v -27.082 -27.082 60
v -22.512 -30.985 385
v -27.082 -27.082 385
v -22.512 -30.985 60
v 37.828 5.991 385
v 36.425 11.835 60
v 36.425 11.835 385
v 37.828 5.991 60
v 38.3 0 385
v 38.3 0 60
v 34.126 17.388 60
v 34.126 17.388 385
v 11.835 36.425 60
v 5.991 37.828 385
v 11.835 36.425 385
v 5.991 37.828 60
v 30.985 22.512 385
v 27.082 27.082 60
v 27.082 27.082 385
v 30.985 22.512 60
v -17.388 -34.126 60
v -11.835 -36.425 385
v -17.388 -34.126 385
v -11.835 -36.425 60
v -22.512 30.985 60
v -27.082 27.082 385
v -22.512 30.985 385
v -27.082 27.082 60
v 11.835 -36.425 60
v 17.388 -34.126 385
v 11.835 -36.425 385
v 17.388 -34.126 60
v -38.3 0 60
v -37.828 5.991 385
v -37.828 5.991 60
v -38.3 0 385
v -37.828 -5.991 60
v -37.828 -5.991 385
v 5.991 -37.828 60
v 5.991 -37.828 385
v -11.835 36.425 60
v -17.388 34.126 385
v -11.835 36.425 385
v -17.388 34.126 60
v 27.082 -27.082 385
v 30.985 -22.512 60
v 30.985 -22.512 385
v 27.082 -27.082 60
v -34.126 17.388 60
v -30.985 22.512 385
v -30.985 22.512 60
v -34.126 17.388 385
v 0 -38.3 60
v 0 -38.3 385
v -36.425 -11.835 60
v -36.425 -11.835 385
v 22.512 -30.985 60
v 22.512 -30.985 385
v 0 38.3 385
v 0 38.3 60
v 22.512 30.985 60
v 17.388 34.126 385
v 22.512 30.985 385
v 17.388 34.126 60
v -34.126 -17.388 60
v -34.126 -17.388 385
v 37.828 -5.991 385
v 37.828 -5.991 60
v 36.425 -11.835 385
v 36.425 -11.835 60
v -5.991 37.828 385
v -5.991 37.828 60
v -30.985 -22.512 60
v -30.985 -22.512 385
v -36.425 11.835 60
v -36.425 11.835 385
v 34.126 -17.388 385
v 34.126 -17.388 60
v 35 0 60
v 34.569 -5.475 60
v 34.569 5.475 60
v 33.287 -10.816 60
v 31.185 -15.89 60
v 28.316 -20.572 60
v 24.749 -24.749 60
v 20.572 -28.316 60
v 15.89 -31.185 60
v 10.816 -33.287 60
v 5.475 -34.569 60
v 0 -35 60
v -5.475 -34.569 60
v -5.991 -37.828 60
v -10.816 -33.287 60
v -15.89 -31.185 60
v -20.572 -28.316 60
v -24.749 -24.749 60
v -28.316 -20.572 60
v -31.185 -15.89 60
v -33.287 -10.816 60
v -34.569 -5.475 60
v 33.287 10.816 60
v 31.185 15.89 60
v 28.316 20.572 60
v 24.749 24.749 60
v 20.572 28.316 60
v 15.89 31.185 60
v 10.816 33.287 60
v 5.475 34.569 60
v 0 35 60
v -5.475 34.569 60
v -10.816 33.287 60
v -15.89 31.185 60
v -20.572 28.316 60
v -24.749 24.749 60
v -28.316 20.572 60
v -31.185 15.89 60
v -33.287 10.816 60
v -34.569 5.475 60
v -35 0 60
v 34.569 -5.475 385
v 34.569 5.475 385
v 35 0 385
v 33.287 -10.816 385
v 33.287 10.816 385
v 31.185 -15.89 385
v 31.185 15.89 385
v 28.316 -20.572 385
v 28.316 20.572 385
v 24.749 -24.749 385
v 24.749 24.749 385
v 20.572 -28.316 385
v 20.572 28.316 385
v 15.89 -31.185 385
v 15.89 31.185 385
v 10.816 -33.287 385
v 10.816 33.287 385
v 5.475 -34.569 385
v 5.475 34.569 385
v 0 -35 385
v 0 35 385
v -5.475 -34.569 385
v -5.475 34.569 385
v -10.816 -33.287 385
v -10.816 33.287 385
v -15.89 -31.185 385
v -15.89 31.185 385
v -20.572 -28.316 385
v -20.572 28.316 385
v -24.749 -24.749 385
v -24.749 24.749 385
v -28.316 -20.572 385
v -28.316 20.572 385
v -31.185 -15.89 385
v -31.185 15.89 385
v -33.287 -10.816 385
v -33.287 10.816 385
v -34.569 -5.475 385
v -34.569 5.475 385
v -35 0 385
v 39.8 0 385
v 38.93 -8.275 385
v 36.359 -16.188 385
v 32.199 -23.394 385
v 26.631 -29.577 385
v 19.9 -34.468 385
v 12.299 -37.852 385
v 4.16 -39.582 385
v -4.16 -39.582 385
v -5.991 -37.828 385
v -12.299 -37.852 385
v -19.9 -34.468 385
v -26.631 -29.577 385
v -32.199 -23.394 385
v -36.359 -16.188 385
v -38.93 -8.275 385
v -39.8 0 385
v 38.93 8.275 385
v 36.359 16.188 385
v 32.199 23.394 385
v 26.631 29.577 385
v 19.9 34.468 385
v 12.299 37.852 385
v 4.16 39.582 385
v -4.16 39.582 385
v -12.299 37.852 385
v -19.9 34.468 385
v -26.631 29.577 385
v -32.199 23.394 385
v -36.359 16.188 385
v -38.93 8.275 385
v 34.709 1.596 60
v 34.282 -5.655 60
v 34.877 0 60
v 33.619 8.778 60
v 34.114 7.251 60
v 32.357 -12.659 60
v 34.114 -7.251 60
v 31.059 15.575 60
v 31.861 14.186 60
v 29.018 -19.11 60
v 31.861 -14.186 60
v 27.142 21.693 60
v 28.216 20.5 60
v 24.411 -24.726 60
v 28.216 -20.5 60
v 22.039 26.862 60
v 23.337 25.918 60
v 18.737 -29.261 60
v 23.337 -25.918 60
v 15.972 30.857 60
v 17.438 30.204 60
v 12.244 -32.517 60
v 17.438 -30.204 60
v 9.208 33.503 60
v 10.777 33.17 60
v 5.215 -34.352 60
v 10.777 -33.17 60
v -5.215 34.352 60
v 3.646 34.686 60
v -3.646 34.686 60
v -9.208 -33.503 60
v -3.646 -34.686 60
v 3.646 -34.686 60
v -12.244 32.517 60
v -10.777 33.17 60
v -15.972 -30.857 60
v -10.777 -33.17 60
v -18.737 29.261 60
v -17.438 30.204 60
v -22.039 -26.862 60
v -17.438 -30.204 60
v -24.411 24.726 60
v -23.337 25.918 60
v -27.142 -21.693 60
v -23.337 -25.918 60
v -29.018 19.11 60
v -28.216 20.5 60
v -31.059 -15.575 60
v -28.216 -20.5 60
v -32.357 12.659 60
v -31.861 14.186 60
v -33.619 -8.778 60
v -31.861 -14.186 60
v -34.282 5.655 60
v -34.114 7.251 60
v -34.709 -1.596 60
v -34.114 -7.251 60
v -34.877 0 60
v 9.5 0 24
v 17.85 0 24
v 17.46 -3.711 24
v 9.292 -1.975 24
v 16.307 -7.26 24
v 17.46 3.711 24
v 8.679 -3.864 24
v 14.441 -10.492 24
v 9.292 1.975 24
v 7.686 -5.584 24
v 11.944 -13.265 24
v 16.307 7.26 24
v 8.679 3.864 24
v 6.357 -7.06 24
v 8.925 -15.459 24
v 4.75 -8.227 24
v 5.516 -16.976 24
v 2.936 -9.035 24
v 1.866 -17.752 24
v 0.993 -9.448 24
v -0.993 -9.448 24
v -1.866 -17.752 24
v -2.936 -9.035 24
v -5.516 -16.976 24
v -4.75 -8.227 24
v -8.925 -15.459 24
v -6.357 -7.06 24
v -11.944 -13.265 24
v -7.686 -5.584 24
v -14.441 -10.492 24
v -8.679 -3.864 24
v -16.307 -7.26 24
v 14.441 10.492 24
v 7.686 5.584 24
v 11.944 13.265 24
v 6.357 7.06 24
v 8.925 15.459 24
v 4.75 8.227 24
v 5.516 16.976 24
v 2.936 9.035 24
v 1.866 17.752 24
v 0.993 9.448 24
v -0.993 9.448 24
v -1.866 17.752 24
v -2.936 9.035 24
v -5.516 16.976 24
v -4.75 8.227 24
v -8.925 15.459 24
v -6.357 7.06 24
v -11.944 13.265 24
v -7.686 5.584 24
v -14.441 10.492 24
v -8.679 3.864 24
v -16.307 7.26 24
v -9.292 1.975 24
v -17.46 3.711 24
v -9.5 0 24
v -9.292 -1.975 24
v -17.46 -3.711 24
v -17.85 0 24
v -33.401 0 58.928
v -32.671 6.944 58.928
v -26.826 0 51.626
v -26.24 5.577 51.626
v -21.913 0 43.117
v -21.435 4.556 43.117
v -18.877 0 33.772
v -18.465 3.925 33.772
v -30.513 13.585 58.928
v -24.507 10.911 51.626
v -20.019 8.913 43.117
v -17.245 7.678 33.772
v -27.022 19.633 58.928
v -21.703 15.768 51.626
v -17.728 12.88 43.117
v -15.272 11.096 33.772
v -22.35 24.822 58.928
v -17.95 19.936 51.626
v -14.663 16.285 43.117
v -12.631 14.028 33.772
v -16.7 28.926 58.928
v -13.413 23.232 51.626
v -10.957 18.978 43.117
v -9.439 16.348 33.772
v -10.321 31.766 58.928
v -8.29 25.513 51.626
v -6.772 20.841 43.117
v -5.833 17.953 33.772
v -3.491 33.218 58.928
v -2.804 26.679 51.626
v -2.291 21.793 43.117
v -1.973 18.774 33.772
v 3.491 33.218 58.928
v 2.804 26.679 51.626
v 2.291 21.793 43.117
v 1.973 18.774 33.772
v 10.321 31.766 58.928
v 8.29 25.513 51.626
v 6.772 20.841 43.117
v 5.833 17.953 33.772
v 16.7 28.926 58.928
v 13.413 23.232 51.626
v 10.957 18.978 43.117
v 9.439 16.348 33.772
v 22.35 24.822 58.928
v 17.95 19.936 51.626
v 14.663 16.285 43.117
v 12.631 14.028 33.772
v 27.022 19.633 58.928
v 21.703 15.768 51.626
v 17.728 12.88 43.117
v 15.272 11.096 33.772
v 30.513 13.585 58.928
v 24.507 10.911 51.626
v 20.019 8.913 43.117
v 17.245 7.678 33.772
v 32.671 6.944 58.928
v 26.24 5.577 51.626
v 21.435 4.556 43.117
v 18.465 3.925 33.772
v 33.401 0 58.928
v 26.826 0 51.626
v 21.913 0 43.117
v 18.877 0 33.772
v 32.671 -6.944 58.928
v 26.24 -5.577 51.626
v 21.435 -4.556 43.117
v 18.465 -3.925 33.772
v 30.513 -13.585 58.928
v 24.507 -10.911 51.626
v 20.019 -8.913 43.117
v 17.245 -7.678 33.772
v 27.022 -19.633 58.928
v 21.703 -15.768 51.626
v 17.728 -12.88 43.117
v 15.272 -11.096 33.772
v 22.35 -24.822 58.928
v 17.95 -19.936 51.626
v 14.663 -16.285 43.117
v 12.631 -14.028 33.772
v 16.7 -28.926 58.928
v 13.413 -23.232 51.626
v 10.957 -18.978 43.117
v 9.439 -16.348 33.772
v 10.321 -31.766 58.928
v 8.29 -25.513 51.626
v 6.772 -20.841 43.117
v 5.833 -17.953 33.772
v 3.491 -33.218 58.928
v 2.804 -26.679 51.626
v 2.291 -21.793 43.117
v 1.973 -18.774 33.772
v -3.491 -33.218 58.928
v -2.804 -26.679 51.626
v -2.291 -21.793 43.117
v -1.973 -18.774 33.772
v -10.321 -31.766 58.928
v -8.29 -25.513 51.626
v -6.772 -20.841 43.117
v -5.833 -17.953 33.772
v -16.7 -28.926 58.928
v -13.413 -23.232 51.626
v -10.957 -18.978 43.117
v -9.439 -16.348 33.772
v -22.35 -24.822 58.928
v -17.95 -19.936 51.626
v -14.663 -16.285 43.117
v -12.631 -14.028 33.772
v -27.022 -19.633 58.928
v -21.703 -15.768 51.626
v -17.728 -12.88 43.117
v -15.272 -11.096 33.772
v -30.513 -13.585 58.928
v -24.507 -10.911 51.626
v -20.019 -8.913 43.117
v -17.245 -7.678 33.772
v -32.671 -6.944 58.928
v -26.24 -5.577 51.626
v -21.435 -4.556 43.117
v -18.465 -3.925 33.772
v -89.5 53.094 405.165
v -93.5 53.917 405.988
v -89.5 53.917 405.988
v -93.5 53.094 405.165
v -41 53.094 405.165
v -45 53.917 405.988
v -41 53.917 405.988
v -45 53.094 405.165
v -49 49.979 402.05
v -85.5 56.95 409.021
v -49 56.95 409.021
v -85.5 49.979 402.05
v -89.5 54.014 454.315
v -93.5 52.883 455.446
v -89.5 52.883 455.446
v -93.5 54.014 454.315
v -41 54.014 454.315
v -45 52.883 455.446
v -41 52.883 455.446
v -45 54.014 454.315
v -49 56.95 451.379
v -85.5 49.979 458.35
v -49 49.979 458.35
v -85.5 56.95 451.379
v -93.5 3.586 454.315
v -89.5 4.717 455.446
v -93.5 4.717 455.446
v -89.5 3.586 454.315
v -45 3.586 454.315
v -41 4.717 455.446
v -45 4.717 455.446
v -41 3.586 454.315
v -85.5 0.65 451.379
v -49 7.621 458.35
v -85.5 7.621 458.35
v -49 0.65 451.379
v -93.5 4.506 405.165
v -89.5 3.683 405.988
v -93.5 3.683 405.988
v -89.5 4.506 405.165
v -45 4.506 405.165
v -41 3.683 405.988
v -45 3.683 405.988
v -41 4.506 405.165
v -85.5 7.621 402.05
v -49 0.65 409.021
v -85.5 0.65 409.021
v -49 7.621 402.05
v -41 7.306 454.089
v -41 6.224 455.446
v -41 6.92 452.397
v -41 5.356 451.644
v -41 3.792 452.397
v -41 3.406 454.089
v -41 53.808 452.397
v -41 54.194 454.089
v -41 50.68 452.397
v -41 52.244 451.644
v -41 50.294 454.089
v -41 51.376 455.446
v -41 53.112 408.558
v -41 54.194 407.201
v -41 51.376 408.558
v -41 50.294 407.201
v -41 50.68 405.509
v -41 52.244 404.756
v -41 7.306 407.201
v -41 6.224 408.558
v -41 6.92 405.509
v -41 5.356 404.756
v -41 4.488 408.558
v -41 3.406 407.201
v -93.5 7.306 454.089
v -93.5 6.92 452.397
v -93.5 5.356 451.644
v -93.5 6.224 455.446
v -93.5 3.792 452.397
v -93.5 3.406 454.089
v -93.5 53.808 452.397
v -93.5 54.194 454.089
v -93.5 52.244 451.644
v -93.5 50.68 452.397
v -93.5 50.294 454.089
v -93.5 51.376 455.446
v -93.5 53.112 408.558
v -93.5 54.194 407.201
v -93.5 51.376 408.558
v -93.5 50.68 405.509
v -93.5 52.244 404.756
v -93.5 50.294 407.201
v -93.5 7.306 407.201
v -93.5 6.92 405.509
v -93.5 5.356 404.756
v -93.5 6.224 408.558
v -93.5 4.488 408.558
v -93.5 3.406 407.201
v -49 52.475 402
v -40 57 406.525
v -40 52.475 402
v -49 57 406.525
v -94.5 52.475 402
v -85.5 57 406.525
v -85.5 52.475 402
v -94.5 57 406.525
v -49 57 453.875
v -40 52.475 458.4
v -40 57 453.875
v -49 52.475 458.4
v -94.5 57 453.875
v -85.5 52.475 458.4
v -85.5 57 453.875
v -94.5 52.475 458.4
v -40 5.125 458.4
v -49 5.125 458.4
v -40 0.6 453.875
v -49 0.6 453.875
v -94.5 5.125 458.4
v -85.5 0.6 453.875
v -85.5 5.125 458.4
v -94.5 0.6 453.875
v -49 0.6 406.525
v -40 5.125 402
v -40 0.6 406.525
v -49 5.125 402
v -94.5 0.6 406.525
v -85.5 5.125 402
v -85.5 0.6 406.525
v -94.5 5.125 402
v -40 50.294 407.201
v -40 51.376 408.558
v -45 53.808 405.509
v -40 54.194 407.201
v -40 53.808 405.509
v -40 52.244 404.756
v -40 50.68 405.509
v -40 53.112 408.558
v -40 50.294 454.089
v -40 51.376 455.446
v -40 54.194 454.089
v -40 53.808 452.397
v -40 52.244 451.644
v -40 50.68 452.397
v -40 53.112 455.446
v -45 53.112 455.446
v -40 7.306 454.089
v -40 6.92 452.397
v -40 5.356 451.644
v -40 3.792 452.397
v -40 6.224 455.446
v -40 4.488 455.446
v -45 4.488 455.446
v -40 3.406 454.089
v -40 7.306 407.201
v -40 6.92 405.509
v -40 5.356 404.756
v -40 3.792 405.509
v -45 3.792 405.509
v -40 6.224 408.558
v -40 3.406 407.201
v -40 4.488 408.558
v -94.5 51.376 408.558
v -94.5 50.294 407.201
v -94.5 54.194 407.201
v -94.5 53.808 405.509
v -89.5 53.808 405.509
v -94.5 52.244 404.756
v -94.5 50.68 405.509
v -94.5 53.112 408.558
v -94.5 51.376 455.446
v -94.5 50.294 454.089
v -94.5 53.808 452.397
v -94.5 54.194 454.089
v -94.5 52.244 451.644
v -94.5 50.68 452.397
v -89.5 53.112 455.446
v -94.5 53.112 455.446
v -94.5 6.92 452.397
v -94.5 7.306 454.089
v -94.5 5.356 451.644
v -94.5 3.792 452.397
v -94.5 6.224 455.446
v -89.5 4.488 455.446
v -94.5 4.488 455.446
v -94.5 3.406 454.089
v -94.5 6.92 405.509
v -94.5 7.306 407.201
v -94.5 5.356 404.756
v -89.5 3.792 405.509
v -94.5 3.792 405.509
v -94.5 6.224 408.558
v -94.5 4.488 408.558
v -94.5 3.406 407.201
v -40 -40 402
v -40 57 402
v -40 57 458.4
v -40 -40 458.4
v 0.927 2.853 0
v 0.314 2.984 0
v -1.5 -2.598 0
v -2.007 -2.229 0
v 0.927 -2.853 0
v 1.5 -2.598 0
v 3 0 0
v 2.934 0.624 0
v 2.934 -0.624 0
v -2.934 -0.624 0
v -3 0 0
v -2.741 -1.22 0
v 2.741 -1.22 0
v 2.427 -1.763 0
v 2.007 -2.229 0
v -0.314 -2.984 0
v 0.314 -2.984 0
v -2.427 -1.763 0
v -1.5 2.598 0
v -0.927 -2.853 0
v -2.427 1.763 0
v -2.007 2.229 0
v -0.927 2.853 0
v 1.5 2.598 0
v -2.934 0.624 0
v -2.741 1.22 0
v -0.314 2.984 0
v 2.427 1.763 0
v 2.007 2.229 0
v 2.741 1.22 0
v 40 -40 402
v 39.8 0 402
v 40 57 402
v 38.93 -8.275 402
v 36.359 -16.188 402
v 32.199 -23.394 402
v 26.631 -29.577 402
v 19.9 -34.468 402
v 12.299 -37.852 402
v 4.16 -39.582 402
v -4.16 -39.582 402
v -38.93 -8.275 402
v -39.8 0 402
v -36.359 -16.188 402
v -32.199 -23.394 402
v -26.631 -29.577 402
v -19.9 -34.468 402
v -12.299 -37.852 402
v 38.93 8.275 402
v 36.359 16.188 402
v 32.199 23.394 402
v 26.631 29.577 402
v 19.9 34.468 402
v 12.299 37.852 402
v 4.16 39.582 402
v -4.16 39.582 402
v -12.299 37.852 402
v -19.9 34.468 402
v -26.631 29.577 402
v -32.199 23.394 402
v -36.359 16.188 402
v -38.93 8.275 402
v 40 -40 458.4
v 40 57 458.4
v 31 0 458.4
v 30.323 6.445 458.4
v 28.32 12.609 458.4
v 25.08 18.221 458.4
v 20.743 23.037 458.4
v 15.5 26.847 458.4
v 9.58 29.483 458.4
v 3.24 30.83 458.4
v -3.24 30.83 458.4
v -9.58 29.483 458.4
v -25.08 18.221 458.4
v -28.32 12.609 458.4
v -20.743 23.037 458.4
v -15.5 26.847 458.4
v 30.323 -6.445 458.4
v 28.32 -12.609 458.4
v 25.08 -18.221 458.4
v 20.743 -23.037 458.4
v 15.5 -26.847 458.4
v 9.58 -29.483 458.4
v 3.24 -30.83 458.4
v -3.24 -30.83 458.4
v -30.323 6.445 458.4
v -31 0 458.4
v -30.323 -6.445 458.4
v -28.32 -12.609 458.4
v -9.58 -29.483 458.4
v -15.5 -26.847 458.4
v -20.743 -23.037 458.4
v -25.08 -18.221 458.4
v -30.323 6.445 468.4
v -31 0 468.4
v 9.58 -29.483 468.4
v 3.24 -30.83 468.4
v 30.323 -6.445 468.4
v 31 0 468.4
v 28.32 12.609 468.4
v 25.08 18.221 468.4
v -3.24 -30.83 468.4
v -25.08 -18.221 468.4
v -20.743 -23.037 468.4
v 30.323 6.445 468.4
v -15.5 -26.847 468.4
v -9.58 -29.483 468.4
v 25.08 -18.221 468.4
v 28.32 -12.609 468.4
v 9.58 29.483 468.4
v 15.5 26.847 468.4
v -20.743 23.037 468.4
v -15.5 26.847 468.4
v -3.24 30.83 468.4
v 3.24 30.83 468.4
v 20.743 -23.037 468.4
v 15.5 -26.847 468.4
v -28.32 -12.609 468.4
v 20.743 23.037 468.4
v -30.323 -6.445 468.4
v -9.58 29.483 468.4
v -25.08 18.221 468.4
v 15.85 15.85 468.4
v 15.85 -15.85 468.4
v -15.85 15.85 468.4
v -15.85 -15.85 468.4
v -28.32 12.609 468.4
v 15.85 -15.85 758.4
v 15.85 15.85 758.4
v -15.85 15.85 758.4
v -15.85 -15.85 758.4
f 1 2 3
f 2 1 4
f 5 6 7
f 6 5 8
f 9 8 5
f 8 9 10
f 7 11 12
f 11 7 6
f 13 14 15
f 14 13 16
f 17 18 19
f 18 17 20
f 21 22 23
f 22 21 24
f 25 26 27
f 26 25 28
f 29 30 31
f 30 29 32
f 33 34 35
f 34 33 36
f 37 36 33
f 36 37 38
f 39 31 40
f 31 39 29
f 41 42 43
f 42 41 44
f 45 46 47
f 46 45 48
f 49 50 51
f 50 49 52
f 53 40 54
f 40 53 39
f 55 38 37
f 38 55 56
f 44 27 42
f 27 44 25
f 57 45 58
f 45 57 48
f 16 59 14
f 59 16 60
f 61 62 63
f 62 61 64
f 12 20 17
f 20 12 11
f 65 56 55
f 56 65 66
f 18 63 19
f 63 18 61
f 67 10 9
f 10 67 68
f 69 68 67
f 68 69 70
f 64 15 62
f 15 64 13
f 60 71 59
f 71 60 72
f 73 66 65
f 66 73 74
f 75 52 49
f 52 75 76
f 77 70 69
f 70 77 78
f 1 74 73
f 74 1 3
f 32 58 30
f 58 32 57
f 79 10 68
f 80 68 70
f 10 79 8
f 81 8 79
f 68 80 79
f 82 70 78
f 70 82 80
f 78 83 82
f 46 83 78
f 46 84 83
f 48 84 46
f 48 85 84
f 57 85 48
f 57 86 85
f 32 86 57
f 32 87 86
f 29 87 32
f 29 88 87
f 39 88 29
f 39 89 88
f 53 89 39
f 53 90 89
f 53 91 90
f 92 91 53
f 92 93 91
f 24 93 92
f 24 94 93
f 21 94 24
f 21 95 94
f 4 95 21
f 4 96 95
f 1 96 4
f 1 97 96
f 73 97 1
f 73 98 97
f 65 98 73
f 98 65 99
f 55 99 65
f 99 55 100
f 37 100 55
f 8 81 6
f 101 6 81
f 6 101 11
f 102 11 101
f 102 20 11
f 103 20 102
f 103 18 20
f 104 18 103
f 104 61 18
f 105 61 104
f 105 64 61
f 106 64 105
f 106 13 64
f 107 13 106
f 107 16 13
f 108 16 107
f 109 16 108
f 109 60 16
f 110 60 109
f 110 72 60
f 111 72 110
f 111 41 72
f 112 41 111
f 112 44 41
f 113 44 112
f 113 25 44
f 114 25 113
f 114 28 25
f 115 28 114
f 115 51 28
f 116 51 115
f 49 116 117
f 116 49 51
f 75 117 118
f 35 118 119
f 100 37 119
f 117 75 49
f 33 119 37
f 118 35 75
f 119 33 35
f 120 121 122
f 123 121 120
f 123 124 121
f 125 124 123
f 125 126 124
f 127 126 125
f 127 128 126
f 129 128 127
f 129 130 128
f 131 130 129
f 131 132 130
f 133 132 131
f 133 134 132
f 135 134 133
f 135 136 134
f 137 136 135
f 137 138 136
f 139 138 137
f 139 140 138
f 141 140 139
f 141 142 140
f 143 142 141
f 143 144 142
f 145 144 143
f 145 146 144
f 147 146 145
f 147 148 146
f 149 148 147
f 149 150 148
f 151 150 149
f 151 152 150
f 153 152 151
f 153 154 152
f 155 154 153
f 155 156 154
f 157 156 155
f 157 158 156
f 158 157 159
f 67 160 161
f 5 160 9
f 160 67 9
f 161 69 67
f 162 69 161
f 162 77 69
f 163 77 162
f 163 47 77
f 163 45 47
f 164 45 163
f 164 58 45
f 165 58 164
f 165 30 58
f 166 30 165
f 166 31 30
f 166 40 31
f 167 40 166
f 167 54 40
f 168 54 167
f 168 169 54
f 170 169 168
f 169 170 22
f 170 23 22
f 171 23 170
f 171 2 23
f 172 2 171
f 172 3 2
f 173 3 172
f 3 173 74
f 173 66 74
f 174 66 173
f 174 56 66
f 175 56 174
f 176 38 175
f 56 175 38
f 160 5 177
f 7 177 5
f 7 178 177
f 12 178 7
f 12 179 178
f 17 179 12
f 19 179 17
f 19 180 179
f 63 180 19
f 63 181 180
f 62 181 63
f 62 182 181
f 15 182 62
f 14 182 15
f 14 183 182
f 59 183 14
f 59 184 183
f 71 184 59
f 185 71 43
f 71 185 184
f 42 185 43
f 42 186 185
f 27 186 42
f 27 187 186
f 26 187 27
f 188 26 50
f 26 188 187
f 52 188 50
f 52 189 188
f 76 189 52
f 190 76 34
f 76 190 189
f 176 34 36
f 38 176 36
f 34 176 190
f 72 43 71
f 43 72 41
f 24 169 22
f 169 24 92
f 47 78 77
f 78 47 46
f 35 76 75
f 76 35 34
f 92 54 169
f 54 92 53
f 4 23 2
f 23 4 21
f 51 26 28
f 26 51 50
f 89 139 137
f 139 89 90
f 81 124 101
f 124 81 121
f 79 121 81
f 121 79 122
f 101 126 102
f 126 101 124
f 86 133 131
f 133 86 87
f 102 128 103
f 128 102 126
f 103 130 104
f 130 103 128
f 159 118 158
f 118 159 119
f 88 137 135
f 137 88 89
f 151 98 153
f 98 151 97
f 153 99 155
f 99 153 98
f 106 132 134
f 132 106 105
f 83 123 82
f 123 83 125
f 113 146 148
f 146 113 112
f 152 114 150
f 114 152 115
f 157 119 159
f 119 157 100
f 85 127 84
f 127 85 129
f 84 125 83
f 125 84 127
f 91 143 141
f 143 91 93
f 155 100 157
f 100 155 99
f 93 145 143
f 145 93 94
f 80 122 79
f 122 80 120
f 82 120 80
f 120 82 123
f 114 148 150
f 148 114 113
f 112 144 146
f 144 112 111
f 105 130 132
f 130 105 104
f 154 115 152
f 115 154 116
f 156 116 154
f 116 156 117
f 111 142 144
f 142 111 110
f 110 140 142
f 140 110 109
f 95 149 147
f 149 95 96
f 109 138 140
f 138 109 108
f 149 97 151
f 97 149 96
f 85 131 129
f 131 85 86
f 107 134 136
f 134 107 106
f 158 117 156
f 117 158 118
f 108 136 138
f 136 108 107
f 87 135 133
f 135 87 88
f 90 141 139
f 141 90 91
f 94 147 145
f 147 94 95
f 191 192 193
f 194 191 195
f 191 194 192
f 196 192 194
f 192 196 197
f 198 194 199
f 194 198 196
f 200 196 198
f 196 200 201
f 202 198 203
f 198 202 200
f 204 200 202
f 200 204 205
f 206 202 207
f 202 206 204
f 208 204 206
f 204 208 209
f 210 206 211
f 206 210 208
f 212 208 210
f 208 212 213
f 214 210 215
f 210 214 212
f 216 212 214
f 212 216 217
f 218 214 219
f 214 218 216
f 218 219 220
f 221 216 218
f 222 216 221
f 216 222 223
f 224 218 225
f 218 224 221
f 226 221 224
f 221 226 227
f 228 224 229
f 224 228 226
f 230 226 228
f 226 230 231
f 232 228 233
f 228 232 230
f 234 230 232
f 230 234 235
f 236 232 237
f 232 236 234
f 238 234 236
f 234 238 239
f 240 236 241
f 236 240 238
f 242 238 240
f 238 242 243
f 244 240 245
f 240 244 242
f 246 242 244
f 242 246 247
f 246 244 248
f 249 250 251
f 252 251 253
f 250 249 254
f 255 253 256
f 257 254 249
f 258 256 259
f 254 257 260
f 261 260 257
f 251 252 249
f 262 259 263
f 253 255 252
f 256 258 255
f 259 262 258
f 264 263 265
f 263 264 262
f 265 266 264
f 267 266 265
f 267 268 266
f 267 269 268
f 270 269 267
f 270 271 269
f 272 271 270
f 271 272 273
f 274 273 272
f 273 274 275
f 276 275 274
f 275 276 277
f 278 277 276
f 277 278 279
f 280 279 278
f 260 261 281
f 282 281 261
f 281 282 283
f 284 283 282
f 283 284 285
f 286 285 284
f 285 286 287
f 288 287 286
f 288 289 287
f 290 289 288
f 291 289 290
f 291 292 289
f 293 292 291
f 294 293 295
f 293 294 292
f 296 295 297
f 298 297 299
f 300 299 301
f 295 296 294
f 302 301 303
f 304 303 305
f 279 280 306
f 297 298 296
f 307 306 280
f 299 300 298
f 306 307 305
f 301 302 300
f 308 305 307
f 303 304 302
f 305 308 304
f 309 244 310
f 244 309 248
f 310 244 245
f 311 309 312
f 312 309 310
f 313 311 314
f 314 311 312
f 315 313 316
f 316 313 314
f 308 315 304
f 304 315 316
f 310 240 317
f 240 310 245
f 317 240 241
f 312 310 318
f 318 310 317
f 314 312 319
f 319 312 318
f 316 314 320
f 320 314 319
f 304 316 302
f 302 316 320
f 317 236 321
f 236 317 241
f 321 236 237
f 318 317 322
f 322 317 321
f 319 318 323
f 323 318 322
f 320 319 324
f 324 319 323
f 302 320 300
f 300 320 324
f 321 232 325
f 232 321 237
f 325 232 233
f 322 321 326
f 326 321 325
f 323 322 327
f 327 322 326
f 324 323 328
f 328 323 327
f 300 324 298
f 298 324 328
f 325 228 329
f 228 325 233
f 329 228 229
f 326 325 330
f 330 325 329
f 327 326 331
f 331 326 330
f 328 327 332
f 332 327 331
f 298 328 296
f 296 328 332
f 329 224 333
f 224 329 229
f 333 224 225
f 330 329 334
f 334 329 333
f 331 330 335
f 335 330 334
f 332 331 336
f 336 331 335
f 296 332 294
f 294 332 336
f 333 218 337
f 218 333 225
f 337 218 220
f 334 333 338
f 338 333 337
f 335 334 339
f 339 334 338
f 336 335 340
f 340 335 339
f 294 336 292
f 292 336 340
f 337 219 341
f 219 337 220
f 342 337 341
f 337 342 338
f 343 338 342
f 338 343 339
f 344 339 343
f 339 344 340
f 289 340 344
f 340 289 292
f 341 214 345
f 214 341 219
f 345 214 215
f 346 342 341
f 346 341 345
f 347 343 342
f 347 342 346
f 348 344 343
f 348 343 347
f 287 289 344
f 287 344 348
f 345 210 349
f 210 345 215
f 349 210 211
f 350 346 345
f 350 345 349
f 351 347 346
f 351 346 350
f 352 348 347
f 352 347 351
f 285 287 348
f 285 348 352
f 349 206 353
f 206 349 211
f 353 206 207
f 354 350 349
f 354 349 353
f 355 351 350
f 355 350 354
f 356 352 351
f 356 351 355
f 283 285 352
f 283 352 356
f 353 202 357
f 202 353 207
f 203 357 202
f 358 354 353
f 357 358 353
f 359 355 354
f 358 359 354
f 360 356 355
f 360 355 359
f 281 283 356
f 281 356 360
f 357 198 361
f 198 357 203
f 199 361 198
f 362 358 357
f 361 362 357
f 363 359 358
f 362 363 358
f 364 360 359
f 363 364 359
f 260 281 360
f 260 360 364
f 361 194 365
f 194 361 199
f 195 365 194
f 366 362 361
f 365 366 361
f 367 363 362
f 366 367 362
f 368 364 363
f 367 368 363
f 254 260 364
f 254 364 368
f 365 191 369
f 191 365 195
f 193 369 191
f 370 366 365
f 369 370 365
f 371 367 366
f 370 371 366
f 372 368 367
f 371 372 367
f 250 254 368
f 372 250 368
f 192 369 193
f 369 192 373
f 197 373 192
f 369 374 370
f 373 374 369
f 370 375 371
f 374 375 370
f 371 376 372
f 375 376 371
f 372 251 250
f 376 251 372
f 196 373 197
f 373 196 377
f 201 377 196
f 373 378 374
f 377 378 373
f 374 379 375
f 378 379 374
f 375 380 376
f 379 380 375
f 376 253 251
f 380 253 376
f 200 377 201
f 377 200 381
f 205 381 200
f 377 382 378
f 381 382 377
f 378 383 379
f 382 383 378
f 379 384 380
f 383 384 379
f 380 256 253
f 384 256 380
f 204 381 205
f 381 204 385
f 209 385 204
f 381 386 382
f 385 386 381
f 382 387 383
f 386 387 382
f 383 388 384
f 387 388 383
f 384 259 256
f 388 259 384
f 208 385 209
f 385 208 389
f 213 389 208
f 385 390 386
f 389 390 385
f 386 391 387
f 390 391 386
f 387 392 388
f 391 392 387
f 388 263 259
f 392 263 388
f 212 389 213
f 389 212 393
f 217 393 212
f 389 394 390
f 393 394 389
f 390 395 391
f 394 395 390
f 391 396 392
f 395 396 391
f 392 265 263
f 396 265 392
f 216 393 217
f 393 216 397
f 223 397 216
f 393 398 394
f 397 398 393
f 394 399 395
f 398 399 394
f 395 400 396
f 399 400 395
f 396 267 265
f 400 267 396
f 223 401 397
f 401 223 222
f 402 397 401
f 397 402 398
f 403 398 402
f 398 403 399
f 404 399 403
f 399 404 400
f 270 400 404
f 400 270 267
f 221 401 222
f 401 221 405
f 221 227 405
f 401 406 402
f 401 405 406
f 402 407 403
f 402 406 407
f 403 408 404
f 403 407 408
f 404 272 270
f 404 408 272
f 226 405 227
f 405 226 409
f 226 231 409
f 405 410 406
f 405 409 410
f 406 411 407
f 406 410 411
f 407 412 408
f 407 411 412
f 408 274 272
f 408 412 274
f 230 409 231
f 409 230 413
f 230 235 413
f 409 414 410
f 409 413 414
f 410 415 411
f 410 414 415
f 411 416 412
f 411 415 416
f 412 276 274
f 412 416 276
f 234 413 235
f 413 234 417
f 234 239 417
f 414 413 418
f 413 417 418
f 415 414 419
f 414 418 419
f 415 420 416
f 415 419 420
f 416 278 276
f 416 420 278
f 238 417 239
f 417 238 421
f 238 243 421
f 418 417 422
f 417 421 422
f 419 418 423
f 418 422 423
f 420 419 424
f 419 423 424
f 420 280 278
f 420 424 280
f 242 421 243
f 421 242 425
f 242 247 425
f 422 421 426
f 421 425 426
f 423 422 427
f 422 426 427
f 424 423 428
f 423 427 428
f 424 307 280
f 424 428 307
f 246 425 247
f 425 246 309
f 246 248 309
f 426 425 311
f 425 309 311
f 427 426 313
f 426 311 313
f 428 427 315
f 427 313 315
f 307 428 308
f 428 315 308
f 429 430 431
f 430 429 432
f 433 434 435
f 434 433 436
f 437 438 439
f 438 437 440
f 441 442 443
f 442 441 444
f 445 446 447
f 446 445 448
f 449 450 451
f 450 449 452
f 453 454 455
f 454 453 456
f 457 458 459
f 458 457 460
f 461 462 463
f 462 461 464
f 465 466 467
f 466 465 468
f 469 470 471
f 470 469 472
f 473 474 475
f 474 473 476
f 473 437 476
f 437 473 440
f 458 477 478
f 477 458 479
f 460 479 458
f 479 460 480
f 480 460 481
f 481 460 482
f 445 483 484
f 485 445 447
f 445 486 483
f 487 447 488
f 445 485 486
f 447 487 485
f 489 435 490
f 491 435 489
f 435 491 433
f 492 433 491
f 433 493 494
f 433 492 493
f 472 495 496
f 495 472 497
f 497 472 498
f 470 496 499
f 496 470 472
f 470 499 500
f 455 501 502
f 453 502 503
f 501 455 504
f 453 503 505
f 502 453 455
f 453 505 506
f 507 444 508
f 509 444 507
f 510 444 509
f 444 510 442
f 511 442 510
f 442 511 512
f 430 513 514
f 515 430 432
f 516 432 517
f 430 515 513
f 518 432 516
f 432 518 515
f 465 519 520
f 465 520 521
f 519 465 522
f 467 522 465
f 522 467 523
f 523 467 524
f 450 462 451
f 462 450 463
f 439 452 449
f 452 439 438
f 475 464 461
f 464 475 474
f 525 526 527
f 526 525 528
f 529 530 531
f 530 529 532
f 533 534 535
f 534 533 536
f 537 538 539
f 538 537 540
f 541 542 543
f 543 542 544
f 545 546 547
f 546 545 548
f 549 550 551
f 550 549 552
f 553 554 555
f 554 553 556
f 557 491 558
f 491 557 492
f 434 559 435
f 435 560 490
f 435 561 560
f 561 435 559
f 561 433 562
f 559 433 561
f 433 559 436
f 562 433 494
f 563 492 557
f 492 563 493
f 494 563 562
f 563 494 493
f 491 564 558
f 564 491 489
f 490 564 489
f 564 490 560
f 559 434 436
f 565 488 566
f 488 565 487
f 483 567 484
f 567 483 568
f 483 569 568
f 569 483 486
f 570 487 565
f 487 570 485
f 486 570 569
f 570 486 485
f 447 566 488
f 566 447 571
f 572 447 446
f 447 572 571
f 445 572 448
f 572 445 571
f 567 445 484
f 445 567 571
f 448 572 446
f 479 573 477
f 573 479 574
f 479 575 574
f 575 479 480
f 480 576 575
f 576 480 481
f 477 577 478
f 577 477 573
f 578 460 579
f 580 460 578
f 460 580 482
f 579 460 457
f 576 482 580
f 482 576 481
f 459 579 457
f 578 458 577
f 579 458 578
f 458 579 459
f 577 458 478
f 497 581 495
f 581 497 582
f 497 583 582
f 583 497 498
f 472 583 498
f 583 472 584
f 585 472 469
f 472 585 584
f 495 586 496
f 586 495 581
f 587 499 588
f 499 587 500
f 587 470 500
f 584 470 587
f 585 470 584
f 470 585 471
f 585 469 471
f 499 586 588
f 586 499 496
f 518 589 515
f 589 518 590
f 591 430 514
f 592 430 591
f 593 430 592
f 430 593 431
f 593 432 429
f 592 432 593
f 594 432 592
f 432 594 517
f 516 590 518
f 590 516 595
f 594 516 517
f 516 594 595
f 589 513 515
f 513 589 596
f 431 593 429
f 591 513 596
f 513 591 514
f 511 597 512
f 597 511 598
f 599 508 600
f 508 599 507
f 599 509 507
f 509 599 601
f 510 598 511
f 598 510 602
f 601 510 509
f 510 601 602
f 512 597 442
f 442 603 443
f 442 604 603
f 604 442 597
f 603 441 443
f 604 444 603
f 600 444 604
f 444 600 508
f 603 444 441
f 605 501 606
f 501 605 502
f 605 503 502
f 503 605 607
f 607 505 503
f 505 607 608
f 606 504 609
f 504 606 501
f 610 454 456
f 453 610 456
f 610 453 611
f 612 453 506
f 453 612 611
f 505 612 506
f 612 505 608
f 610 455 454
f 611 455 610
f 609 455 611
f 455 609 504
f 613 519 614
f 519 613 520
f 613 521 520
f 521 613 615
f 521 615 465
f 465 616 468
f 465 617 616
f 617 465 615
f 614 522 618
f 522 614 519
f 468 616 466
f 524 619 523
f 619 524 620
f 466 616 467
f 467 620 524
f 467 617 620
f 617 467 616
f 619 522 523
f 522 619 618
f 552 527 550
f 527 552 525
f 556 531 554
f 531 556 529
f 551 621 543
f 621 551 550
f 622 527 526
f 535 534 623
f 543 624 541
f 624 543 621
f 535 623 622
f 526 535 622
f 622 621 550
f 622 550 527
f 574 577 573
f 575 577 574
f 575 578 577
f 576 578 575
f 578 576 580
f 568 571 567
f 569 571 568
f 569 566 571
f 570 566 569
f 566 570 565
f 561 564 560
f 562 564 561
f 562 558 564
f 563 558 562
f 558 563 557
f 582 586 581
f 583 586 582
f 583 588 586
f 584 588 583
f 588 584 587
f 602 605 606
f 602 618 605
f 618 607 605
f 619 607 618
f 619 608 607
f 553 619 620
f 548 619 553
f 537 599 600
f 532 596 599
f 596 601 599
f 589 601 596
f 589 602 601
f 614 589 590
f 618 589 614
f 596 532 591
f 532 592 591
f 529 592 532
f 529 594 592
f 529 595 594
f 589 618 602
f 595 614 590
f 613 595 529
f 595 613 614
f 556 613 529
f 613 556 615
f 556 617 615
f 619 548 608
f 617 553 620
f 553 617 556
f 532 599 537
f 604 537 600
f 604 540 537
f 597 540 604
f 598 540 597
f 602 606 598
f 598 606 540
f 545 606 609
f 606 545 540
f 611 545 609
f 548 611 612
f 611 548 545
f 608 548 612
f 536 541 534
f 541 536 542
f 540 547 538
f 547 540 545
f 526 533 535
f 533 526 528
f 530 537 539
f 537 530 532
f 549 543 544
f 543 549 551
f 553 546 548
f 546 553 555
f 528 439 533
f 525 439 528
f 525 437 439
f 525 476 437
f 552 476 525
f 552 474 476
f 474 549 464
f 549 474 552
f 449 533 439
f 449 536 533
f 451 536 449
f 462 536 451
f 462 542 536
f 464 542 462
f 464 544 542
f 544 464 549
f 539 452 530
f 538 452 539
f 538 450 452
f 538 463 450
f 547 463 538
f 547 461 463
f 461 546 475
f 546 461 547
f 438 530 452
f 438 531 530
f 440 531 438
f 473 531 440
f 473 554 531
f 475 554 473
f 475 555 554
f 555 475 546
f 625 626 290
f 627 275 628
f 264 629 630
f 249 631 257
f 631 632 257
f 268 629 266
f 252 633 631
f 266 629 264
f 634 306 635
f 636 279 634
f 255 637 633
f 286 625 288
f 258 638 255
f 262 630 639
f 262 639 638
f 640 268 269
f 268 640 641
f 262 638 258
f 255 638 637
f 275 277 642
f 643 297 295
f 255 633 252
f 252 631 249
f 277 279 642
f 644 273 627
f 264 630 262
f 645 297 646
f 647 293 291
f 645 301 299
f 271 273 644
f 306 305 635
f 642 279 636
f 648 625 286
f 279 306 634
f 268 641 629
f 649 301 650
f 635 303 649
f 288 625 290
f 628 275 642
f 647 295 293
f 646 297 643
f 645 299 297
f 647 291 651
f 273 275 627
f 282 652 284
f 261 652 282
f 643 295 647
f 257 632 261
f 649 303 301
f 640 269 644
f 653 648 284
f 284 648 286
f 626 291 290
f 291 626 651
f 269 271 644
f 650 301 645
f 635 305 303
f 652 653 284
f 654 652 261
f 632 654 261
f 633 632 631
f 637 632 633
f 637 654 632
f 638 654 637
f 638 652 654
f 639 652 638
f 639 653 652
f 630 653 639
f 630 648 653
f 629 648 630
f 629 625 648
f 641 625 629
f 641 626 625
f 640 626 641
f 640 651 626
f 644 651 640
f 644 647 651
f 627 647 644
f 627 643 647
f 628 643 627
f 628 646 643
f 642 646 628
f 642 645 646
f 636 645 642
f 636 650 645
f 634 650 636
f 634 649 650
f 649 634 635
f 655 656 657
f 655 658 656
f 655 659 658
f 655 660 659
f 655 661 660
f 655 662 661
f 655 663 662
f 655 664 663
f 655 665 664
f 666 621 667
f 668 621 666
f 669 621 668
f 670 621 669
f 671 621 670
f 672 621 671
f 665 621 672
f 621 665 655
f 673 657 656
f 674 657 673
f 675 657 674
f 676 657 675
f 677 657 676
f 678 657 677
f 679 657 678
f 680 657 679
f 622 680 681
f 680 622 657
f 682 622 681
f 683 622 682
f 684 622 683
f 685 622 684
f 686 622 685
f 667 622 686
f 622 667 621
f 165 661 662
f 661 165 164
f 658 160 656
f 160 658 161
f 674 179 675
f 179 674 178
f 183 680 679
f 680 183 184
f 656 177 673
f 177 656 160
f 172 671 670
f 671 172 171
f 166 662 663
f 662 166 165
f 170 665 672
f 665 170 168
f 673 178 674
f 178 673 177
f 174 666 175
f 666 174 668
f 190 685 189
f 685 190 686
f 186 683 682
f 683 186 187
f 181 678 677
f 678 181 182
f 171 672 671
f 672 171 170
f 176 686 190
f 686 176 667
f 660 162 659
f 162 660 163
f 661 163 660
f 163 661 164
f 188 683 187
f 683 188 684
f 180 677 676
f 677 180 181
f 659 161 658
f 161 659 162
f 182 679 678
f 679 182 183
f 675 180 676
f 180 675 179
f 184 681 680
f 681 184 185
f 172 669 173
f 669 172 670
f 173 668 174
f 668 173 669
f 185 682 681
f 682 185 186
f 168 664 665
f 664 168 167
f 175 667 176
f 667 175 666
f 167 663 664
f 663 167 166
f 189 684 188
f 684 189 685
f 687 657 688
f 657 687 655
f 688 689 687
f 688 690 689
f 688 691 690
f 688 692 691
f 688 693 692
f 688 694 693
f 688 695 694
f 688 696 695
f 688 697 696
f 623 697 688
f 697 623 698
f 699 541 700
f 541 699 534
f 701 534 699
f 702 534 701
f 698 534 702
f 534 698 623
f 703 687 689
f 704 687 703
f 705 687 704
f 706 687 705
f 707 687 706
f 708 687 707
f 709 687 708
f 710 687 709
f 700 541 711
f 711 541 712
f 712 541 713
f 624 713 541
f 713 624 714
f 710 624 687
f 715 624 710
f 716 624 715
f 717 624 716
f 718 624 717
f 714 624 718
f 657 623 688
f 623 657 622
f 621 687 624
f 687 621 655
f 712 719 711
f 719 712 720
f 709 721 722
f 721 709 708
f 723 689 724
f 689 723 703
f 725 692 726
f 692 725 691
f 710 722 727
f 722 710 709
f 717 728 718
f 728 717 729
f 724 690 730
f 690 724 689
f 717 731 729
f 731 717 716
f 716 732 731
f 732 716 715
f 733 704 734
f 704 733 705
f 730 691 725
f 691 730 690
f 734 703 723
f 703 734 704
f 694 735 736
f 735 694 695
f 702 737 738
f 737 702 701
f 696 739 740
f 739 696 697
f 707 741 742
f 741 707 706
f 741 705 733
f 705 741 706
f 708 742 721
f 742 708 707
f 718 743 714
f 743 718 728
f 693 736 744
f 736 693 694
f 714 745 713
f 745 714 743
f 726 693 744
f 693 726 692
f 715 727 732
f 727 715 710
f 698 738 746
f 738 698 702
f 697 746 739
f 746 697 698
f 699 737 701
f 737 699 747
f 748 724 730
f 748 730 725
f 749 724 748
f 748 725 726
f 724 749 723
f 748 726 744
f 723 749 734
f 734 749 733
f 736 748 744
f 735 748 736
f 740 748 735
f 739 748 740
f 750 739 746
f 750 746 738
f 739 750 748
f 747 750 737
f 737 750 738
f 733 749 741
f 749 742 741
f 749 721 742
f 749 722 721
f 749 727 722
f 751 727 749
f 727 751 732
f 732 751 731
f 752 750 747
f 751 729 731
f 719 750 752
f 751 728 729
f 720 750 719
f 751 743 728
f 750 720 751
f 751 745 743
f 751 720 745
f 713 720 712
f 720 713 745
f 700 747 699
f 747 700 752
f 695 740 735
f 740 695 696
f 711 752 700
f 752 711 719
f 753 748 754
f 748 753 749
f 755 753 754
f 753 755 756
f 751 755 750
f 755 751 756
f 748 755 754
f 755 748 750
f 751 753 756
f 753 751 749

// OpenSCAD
// file: lib/parameters.scad
// Parameters shared between modules
Base_th = 2;
Beam_width = 15;
Wiggle = 0.25;
Fat_beam_width = Beam_width + Wiggle;
Beam_length = 400;
Wall_th = 2.5;
Min_beam_width = 12.5;
Max_beam_width = 17.5;
Zip_th = 2;
Zip_h = Zip_th + Max_beam_width - Min_beam_width;
Zip_w = 5.0;
Nema17_cube_width          = 42.43;
Nema17_screw_hole_width    = 43.74; // Opposite corner screws
Nema17_ring_diameter       = 22;
Nema17_cube_height         = 39.36;
Nema17_shaft_height        = 63.65;
Nema17_ring_height         = 2;
Nema17_shaft_radius        = 5/2;

Nema23_cube_width          = 56.4;
Nema23_cube_height         = 54.5;
Nema23_shaft_height        = 100;
Nema23_screw_hole_width    = 66.31; // Opposite corner screws
b608_outer_dia = 22.2;
b608_width = 7.05;
b608_bore_r = 4;
b608_vgroove_big_r = b608_outer_dia/2 + 2.5;
b608_vgroove_small_r = b608_outer_dia/2 + 0.5;
b608_ugroove_big_r = b608_vgroove_big_r;
b608_ugroove_small_r = b608_vgroove_small_r;
Gap_between_sandwich_and_plate = 1.5 + Base_th; // 1.5 mm for wiggle
Motor_bracket_flerp_r = 6;
Motor_bracket_flerp = 14;
Motor_bracket_cw = Nema17_cube_width + 6;
Motor_bracket_att_ang = 50;
Mounting_screw_d = 3.5;
Mounting_screw_head_d = 14;
Spool_outer_wall_th = 4;

// Corner clamp parameters
Cc_l1 = (Fat_beam_width+2*Wall_th)*2*sqrt(3);
Cc_rad_b = 4;
Cc_action_point_from_mid = Cc_l1/sqrt(3)-2*Cc_rad_b-7;
Cc_plastic_length = sqrt(Cc_action_point_from_mid*Cc_action_point_from_mid
                       - (Cc_action_point_from_mid/2)*(Cc_action_point_from_mid/2));
Eyelet_extra_dist = 0.75;
Eyelet_diameter = 4.30;
Move_d_bearings_inwards = -2;

// The distance between the two action points on the mover
Sidelength = Beam_length + 2*Cc_plastic_length;

/////// Gear parameters ////////////
Circular_pitch = 262;
Motor_teeth = 10;
Gear_height = 21.4-3;
Motor_pitch                      = (Motor_teeth*Circular_pitch/360);
Motor_pitch_diametrial           = Motor_teeth/(2*Motor_pitch);
Motor_outer_radius               = Motor_pitch + 1/Motor_pitch_diametrial;
Spool_teeth = 100;
Spool_r = 75;
Spool_height = 8;
Spool_pitch                      = (Spool_teeth*Circular_pitch/360);
Spool_pitch_diametrial           = Spool_teeth/(2*Spool_pitch);
Spool_outer_radius               = Spool_pitch + 1/Spool_pitch_diametrial;
Sep_disc_radius = (161.83+1)/2; // Made to match 255 teeth gt2 pulley + 1
Motor_bracket_depth = Gear_height+1+7+Nema17_ring_height+1+Gap_between_sandwich_and_plate;
Spool_core_flerp0 = 16+3;

/////// Lineroller parameters ////////////
b623_width  = 4;
b623_bore_r = 3/2;
b623_big_ugroove_big_r = (12+3)/2;
b623_big_ugroove_small_r = (10+3)/2;
b623_outer_dia = 10;
b623_ugroove_room_to_grow_r = 1.1;
b608_ugroove_room_to_grow_r = 1.1;
b623_flange_dia = 11.5;
b623_flange_room_to_grow_r = 0.5;

Depth_of_roller_base = 18;
Roller_flerp = 6;
Roller_l = 42;
Roller_fl = (Roller_l - Depth_of_roller_base)/2;

Line_roller_wall_th = 5;

Line_roller_ABC_winch_h =  Gap_between_sandwich_and_plate
                           + Sep_disc_radius
                           - Spool_r
                           + Depth_of_roller_base/2
                           + b608_vgroove_small_r;

Ptfe_r = 2.1;
Roller_base_r = 8;
Screw_h = 2;
Screw_head_h = 2;
M3_screw_head_d = 5.8;
Spool_center_bearing_wall_th = 5;
Corner_clamp_bearings_center_to_center = max(15, (b623_big_ugroove_big_r + b623_ugroove_room_to_grow_r)*2 + 5);
Anchor_bearings_center_to_center = Corner_clamp_bearings_center_to_center + b623_outer_dia;

//// Lineroller anchor parameters /////

Back_bearing_x = 6 + 1.5;
Front_bearing_x = -6 - 5;
Move_tower = -12.2;
Lower_bearing_z = 13;
Higher_bearing_z = Lower_bearing_z + Corner_clamp_bearings_center_to_center;

//// Cable Clamp parameters /////
Bit_width = 12;
Cable_r=2.5;

// Belt drive parameters
GT2_belt_width = 6.5;
GT2_gear_height = GT2_belt_width + 2;
GT2_motor_gear_height = 16;
GT2_motor_gear_outer_dia = 16;
GT2_spool_gear_outer_dia = 161.82; // Echoed from GT2_spool_gear.scad
GT2_spool_gear_teeth = 255;
GT2_motor_gear_teeth = 20;
Torx_depth = GT2_gear_height/2;
Belt_roller_h = 56;
Belt_thickness = 1.4;

Belt_roller_space_between_walls = 2*b623_width + 0.8;
Belt_roller_wall_th = (Depth_of_roller_base - Belt_roller_space_between_walls)/2+2;
Belt_roller_top_adj_screw_x = Depth_of_roller_base/2-3.7;
Belt_roller_top_adj_screw_y = Belt_roller_space_between_walls/2+2;
Belt_roller_containing_cube_ywidth = Belt_roller_space_between_walls+8.5;
Belt_roller_containing_cube_xwidth = 14;
Belt_roller_insert_h = 18;

Sandwich_ABC_width = 2*(1+Spool_height) + GT2_gear_height;
Sandwich_D_width = 4*(1+Spool_height) + GT2_gear_height;
Spool_core_halve_width = 14.3;
Spool_core_impression_in_spool_cover = 0;
Spool_cover_bottom_th = 1.5;
Spool_cover_shoulder = 2;
Spool_core_cover_adj = Spool_cover_shoulder+Spool_cover_bottom_th-Spool_core_impression_in_spool_cover;
Spool_core_tot_length = 136.458;
Spool_cover_outer_r = Sep_disc_radius + 2;
Gap_between_sep_disc_and_spool_cover = 0.55;

Smooth_rod_length_ABC = Sandwich_ABC_width + 2*(Spool_core_halve_width-Spool_core_impression_in_spool_cover + Spool_cover_bottom_th + Spool_cover_shoulder);
Smooth_rod_length_D = Sandwich_D_width + 2*(Spool_core_halve_width-Spool_core_impression_in_spool_cover + Spool_cover_bottom_th + Spool_cover_shoulder);
echo("Smooth_rod_length_ABC", Smooth_rod_length_ABC);
echo("Smooth_rod_length_D", Smooth_rod_length_D);

Spool_cover_tot_height = Spool_cover_bottom_th+Spool_cover_shoulder+1+Spool_height;
Spool_cover_D_left_tot_height = Spool_cover_shoulder+Spool_cover_bottom_th+1+Spool_height+1+Spool_height;

spd = Spool_height+GT2_gear_height;
// Horizontal_deflector_cube_y_size must be exact this number
// because we want to deflect AB-lines
// 60 degrees on the ceiling unit, and we want to put two
// deflectors in a row and get a distance between bearings
// that maintain the distance d when deflecting 60 degrees
Horizontal_deflector_cube_y_size = (2/sqrt(3))*spd;

Belt_roller_bearing_xpos = Sep_disc_radius + b623_outer_dia/2+Belt_thickness;


// Top plate parameters needed for layout slicer
Yshift_top_plate = -297.8;

Pen_holder_w = 55;
Pen_holder_rail_w = 36;
Pen_holder_bottom_th = 7;

u_width = 7;
Stick_extra = 5;
Stick_length = b623_big_ugroove_big_r*2 + 7*2 + 1*2 + Stick_extra;
Stick_d = 12.5;
// main file
include <lib/parameters.scad>
use <lib/util.scad>

clay_extruder();
module clay_extruder(){
  lift_tube = 60;
  tube_height = 325;
  tube_inner_d = 70;
  tube_outer_d = tube_inner_d + 2*3.3;
  translate([0,0,lift_tube])
    color([0.9,0.9,0.9], 0.4)
      difference(){
        cylinder(d = tube_outer_d, h=tube_height, $fn=10*4);
        translate([0,0,-1])
          cylinder(d = tube_inner_d, h= tube_height+2, $fn=10*4);
      }

  color([0.15,0.15,0.15])
    difference(){
      translate([0,0,lift_tube-36])
        cylinder(d=70, h=36);
      end_r = 35.7/2;
      circle_r = 47;
      translate([0,0,lift_tube-36])
        rotate_extrude()
          translate([circle_r+end_r,0])
            circle(r=circle_r);
    }

  color([0.93,0.1,0.1])
    cylinder(d1 = 6, d2 = 19, h = 24);

  shim_height = 17;
  color([0.15,0.15,0.15])
    translate([0,0,tube_height + lift_tube])
      cylinder(d = tube_outer_d + 3, h = shim_height);

  color([0.5,0.5,0.5])
    translate([-80/2, -80/2, lift_tube + tube_height + shim_height])
      cube([80, 97, Nema23_cube_width]);
  translate([-Nema23_cube_height-80/2, 97-80/2-Nema23_cube_width/2, lift_tube + tube_height + shim_height + Nema23_cube_width/2])
    rotate([0,90,0])
      Nema23();

  topshim_height = 10;
  color([0.6,0.6,0.6])
    translate([0,0,lift_tube + tube_height + shim_height + Nema23_cube_width])
      cylinder(d=62, h=topshim_height);
  w = 31.7;
  color([0.6,0.6,0.6])
    translate([-w/2, -w/2, lift_tube + tube_height + shim_height + Nema23_cube_width])
      cube([w, w, 300]);

}
